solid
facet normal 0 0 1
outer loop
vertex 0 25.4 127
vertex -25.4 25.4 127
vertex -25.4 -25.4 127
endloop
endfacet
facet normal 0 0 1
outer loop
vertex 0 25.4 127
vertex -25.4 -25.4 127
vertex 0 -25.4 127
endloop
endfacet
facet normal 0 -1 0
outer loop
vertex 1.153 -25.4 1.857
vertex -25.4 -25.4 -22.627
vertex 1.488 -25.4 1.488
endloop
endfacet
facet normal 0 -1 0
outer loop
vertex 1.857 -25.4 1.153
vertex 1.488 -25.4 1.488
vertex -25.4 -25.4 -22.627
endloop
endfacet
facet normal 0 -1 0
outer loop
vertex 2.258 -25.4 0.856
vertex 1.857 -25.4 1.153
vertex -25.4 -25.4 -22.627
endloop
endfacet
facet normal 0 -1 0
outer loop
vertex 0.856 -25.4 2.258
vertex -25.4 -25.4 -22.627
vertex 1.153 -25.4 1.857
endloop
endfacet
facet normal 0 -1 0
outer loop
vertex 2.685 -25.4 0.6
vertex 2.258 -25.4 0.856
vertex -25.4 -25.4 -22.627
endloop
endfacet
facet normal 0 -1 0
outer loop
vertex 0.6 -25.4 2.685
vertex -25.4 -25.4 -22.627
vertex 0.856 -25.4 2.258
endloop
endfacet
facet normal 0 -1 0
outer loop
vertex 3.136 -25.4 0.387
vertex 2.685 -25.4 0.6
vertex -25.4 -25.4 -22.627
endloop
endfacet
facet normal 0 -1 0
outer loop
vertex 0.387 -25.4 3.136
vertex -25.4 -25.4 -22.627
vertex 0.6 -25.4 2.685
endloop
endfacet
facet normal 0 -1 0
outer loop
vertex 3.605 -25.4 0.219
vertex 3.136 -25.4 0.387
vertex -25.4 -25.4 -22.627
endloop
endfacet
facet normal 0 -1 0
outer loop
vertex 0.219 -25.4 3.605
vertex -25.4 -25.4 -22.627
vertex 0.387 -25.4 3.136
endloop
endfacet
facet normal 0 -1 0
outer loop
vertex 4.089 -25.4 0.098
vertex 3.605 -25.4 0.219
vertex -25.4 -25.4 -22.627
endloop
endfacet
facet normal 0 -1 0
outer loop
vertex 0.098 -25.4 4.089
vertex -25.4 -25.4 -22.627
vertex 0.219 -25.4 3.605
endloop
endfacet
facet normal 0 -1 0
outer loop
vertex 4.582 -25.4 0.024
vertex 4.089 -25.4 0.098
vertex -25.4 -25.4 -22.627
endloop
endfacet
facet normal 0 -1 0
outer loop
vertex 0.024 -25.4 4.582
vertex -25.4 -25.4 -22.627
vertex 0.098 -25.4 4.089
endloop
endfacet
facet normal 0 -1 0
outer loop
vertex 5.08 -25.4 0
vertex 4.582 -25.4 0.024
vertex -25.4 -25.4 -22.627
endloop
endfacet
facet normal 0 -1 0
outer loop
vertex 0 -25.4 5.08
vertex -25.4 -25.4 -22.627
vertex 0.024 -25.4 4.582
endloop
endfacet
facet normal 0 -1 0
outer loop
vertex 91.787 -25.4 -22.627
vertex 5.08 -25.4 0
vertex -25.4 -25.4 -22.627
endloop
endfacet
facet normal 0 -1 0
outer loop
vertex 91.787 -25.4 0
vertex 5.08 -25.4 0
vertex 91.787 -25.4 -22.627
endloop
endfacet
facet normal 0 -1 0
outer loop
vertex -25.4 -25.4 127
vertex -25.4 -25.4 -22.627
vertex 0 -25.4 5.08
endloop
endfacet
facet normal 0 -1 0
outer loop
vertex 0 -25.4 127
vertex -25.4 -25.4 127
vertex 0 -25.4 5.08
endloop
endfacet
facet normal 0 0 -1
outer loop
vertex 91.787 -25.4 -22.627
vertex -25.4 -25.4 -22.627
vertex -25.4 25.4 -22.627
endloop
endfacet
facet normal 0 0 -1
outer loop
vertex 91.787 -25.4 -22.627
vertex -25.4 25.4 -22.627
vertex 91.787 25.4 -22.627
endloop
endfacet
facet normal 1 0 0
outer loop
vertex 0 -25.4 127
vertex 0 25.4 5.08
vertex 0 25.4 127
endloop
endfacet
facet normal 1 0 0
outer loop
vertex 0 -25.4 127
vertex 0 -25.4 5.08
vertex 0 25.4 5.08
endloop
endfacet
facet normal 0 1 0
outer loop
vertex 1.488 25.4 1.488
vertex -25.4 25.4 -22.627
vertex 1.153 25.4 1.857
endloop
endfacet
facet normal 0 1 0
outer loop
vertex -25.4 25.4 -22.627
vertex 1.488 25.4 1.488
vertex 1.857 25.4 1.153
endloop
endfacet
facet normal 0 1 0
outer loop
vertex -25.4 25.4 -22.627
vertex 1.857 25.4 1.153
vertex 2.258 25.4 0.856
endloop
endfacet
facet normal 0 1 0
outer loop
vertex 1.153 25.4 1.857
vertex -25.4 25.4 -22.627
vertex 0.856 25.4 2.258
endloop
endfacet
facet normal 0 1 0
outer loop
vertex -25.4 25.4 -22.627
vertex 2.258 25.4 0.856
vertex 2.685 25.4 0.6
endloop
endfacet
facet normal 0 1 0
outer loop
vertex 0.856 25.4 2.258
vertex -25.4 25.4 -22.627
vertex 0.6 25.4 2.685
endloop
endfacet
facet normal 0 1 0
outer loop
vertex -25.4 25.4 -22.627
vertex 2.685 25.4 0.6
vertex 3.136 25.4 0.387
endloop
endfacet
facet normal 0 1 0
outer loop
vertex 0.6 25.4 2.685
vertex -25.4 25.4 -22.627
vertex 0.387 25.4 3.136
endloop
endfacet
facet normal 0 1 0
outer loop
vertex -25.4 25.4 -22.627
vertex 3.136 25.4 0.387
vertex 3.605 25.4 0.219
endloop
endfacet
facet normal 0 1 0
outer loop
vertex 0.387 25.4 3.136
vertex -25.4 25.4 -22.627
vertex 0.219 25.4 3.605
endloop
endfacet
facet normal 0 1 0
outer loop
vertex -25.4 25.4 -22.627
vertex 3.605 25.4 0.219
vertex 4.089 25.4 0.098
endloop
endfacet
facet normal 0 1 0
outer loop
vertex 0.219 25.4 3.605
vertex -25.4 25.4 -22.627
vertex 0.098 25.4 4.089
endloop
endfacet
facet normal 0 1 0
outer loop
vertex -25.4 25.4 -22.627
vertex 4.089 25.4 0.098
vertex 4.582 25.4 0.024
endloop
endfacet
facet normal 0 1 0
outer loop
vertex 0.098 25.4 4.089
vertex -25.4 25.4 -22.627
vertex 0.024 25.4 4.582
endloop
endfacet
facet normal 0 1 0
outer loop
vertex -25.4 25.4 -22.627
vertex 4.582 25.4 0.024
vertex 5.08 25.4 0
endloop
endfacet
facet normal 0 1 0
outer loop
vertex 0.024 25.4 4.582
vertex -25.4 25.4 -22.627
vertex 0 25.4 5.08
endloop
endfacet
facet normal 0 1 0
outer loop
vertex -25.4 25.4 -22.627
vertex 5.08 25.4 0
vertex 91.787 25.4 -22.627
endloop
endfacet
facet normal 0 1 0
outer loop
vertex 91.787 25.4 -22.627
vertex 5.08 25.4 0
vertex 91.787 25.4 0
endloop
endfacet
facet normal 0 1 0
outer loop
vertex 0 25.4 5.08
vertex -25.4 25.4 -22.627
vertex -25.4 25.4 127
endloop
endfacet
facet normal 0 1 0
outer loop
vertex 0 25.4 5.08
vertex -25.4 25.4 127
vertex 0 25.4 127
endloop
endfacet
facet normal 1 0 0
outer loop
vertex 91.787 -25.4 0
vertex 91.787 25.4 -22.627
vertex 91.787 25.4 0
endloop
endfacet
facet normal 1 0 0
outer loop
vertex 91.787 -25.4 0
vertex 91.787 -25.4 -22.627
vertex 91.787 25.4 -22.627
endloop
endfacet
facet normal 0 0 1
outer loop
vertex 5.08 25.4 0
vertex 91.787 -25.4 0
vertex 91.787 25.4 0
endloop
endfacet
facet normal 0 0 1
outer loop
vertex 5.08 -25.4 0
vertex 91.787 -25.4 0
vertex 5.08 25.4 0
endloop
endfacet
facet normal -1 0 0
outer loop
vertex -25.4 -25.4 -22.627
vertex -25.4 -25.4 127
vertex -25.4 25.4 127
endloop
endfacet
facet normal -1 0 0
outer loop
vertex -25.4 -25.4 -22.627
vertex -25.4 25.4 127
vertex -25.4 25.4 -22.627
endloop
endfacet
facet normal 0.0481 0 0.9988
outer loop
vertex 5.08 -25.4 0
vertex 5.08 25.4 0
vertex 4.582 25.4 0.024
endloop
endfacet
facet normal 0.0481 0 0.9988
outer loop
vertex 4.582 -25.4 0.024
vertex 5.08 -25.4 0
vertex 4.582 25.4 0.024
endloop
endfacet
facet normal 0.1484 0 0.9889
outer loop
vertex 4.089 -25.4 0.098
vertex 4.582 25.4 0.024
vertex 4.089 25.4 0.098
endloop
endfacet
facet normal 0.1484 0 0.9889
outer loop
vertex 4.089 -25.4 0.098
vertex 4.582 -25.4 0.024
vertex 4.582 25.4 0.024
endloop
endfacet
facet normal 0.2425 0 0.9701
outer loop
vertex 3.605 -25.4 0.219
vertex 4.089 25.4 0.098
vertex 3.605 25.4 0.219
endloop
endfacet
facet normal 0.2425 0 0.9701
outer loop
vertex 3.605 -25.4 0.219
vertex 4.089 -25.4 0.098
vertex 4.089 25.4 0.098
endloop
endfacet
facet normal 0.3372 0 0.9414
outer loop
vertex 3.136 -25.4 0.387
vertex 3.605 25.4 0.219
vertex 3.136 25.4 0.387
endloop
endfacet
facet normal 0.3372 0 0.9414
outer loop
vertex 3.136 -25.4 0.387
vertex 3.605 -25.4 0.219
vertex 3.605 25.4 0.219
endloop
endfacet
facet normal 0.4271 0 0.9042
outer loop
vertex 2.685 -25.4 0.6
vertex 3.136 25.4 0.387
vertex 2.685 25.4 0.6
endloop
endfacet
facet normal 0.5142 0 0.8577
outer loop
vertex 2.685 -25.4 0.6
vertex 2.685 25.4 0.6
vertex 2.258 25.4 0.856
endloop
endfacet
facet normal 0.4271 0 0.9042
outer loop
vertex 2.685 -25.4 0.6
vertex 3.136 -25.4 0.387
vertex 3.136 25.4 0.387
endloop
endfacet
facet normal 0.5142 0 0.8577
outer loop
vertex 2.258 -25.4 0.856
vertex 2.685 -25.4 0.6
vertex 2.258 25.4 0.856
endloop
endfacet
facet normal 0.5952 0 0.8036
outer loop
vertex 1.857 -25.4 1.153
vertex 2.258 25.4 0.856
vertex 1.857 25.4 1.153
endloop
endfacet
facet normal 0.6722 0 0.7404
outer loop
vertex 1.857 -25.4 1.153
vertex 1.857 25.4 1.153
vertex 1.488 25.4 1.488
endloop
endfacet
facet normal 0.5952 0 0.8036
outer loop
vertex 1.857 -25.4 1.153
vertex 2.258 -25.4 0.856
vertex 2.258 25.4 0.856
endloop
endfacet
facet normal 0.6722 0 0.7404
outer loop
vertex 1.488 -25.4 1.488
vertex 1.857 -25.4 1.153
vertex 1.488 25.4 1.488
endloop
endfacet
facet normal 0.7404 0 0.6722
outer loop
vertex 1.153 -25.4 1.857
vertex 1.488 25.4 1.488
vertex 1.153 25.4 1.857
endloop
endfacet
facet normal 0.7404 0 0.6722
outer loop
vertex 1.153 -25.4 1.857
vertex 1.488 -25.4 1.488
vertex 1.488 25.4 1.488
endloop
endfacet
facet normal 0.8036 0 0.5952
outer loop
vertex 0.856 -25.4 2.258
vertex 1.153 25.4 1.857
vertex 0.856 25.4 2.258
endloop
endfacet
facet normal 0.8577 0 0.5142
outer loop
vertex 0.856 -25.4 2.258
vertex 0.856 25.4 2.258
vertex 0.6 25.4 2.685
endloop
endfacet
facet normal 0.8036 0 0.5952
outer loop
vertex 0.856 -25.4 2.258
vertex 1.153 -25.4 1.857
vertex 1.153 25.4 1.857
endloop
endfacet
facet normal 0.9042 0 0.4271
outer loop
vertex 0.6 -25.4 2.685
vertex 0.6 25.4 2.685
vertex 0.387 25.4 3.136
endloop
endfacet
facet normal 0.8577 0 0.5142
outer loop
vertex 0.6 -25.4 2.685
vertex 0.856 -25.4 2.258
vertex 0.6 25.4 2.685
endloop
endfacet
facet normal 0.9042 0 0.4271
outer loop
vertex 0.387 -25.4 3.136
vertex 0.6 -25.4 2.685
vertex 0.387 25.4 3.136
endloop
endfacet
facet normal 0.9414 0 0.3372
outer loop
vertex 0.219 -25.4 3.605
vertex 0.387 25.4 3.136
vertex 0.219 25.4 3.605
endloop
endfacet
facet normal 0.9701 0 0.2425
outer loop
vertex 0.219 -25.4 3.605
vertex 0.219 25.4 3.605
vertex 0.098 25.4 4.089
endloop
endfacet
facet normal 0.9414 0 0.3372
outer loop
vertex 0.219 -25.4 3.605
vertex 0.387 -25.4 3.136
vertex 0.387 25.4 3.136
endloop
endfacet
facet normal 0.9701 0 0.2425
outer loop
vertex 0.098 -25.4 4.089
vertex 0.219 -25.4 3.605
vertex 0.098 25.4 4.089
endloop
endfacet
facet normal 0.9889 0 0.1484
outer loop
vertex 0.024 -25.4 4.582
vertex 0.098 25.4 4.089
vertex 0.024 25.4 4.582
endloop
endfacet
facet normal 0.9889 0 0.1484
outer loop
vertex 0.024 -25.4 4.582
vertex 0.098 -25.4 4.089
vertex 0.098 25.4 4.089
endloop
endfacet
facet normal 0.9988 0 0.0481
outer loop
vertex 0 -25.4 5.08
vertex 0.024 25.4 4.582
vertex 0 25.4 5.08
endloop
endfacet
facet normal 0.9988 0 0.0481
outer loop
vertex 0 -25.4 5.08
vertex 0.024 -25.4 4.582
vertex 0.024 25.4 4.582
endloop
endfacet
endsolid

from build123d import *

# Parameters (mm, degrees)
F0_W          = 25.4
F0_H          = 127
F1_DEPTH      = 25.4
F2_DEPTH      = 25.4
F2_DEPTH_BACK = 25.4
F3_R          = 5.08


with BuildPart() as f1:
    # F0 (on Front) → F1 (new body, symmetric)
    with BuildSketch(Plane.XZ):
        with Locations((-12.7, 63.5)):
            Rectangle(F0_W, F0_H)
    extrude(amount=F1_DEPTH, both=True)

    # F0 (on Front) → F2 (join, two sides)
    with BuildSketch(Plane.XZ) as f2_sk:
        Polygon((91.7868316174, 0), (0, 0), (-25.4, 0), (-25.4, -22.6269382983), (91.7868316174, -22.6269382983), align=None)
    extrude(amount=F2_DEPTH)
    extrude(f2_sk.sketch, amount=-F2_DEPTH_BACK)

    # F3
    f3_edges = [f1.edges().sort_by_distance(p)[0] for p in [
        (0, 0, 0),
    ]]
    fillet(f3_edges, radius=F3_R)


solid = f1.part
